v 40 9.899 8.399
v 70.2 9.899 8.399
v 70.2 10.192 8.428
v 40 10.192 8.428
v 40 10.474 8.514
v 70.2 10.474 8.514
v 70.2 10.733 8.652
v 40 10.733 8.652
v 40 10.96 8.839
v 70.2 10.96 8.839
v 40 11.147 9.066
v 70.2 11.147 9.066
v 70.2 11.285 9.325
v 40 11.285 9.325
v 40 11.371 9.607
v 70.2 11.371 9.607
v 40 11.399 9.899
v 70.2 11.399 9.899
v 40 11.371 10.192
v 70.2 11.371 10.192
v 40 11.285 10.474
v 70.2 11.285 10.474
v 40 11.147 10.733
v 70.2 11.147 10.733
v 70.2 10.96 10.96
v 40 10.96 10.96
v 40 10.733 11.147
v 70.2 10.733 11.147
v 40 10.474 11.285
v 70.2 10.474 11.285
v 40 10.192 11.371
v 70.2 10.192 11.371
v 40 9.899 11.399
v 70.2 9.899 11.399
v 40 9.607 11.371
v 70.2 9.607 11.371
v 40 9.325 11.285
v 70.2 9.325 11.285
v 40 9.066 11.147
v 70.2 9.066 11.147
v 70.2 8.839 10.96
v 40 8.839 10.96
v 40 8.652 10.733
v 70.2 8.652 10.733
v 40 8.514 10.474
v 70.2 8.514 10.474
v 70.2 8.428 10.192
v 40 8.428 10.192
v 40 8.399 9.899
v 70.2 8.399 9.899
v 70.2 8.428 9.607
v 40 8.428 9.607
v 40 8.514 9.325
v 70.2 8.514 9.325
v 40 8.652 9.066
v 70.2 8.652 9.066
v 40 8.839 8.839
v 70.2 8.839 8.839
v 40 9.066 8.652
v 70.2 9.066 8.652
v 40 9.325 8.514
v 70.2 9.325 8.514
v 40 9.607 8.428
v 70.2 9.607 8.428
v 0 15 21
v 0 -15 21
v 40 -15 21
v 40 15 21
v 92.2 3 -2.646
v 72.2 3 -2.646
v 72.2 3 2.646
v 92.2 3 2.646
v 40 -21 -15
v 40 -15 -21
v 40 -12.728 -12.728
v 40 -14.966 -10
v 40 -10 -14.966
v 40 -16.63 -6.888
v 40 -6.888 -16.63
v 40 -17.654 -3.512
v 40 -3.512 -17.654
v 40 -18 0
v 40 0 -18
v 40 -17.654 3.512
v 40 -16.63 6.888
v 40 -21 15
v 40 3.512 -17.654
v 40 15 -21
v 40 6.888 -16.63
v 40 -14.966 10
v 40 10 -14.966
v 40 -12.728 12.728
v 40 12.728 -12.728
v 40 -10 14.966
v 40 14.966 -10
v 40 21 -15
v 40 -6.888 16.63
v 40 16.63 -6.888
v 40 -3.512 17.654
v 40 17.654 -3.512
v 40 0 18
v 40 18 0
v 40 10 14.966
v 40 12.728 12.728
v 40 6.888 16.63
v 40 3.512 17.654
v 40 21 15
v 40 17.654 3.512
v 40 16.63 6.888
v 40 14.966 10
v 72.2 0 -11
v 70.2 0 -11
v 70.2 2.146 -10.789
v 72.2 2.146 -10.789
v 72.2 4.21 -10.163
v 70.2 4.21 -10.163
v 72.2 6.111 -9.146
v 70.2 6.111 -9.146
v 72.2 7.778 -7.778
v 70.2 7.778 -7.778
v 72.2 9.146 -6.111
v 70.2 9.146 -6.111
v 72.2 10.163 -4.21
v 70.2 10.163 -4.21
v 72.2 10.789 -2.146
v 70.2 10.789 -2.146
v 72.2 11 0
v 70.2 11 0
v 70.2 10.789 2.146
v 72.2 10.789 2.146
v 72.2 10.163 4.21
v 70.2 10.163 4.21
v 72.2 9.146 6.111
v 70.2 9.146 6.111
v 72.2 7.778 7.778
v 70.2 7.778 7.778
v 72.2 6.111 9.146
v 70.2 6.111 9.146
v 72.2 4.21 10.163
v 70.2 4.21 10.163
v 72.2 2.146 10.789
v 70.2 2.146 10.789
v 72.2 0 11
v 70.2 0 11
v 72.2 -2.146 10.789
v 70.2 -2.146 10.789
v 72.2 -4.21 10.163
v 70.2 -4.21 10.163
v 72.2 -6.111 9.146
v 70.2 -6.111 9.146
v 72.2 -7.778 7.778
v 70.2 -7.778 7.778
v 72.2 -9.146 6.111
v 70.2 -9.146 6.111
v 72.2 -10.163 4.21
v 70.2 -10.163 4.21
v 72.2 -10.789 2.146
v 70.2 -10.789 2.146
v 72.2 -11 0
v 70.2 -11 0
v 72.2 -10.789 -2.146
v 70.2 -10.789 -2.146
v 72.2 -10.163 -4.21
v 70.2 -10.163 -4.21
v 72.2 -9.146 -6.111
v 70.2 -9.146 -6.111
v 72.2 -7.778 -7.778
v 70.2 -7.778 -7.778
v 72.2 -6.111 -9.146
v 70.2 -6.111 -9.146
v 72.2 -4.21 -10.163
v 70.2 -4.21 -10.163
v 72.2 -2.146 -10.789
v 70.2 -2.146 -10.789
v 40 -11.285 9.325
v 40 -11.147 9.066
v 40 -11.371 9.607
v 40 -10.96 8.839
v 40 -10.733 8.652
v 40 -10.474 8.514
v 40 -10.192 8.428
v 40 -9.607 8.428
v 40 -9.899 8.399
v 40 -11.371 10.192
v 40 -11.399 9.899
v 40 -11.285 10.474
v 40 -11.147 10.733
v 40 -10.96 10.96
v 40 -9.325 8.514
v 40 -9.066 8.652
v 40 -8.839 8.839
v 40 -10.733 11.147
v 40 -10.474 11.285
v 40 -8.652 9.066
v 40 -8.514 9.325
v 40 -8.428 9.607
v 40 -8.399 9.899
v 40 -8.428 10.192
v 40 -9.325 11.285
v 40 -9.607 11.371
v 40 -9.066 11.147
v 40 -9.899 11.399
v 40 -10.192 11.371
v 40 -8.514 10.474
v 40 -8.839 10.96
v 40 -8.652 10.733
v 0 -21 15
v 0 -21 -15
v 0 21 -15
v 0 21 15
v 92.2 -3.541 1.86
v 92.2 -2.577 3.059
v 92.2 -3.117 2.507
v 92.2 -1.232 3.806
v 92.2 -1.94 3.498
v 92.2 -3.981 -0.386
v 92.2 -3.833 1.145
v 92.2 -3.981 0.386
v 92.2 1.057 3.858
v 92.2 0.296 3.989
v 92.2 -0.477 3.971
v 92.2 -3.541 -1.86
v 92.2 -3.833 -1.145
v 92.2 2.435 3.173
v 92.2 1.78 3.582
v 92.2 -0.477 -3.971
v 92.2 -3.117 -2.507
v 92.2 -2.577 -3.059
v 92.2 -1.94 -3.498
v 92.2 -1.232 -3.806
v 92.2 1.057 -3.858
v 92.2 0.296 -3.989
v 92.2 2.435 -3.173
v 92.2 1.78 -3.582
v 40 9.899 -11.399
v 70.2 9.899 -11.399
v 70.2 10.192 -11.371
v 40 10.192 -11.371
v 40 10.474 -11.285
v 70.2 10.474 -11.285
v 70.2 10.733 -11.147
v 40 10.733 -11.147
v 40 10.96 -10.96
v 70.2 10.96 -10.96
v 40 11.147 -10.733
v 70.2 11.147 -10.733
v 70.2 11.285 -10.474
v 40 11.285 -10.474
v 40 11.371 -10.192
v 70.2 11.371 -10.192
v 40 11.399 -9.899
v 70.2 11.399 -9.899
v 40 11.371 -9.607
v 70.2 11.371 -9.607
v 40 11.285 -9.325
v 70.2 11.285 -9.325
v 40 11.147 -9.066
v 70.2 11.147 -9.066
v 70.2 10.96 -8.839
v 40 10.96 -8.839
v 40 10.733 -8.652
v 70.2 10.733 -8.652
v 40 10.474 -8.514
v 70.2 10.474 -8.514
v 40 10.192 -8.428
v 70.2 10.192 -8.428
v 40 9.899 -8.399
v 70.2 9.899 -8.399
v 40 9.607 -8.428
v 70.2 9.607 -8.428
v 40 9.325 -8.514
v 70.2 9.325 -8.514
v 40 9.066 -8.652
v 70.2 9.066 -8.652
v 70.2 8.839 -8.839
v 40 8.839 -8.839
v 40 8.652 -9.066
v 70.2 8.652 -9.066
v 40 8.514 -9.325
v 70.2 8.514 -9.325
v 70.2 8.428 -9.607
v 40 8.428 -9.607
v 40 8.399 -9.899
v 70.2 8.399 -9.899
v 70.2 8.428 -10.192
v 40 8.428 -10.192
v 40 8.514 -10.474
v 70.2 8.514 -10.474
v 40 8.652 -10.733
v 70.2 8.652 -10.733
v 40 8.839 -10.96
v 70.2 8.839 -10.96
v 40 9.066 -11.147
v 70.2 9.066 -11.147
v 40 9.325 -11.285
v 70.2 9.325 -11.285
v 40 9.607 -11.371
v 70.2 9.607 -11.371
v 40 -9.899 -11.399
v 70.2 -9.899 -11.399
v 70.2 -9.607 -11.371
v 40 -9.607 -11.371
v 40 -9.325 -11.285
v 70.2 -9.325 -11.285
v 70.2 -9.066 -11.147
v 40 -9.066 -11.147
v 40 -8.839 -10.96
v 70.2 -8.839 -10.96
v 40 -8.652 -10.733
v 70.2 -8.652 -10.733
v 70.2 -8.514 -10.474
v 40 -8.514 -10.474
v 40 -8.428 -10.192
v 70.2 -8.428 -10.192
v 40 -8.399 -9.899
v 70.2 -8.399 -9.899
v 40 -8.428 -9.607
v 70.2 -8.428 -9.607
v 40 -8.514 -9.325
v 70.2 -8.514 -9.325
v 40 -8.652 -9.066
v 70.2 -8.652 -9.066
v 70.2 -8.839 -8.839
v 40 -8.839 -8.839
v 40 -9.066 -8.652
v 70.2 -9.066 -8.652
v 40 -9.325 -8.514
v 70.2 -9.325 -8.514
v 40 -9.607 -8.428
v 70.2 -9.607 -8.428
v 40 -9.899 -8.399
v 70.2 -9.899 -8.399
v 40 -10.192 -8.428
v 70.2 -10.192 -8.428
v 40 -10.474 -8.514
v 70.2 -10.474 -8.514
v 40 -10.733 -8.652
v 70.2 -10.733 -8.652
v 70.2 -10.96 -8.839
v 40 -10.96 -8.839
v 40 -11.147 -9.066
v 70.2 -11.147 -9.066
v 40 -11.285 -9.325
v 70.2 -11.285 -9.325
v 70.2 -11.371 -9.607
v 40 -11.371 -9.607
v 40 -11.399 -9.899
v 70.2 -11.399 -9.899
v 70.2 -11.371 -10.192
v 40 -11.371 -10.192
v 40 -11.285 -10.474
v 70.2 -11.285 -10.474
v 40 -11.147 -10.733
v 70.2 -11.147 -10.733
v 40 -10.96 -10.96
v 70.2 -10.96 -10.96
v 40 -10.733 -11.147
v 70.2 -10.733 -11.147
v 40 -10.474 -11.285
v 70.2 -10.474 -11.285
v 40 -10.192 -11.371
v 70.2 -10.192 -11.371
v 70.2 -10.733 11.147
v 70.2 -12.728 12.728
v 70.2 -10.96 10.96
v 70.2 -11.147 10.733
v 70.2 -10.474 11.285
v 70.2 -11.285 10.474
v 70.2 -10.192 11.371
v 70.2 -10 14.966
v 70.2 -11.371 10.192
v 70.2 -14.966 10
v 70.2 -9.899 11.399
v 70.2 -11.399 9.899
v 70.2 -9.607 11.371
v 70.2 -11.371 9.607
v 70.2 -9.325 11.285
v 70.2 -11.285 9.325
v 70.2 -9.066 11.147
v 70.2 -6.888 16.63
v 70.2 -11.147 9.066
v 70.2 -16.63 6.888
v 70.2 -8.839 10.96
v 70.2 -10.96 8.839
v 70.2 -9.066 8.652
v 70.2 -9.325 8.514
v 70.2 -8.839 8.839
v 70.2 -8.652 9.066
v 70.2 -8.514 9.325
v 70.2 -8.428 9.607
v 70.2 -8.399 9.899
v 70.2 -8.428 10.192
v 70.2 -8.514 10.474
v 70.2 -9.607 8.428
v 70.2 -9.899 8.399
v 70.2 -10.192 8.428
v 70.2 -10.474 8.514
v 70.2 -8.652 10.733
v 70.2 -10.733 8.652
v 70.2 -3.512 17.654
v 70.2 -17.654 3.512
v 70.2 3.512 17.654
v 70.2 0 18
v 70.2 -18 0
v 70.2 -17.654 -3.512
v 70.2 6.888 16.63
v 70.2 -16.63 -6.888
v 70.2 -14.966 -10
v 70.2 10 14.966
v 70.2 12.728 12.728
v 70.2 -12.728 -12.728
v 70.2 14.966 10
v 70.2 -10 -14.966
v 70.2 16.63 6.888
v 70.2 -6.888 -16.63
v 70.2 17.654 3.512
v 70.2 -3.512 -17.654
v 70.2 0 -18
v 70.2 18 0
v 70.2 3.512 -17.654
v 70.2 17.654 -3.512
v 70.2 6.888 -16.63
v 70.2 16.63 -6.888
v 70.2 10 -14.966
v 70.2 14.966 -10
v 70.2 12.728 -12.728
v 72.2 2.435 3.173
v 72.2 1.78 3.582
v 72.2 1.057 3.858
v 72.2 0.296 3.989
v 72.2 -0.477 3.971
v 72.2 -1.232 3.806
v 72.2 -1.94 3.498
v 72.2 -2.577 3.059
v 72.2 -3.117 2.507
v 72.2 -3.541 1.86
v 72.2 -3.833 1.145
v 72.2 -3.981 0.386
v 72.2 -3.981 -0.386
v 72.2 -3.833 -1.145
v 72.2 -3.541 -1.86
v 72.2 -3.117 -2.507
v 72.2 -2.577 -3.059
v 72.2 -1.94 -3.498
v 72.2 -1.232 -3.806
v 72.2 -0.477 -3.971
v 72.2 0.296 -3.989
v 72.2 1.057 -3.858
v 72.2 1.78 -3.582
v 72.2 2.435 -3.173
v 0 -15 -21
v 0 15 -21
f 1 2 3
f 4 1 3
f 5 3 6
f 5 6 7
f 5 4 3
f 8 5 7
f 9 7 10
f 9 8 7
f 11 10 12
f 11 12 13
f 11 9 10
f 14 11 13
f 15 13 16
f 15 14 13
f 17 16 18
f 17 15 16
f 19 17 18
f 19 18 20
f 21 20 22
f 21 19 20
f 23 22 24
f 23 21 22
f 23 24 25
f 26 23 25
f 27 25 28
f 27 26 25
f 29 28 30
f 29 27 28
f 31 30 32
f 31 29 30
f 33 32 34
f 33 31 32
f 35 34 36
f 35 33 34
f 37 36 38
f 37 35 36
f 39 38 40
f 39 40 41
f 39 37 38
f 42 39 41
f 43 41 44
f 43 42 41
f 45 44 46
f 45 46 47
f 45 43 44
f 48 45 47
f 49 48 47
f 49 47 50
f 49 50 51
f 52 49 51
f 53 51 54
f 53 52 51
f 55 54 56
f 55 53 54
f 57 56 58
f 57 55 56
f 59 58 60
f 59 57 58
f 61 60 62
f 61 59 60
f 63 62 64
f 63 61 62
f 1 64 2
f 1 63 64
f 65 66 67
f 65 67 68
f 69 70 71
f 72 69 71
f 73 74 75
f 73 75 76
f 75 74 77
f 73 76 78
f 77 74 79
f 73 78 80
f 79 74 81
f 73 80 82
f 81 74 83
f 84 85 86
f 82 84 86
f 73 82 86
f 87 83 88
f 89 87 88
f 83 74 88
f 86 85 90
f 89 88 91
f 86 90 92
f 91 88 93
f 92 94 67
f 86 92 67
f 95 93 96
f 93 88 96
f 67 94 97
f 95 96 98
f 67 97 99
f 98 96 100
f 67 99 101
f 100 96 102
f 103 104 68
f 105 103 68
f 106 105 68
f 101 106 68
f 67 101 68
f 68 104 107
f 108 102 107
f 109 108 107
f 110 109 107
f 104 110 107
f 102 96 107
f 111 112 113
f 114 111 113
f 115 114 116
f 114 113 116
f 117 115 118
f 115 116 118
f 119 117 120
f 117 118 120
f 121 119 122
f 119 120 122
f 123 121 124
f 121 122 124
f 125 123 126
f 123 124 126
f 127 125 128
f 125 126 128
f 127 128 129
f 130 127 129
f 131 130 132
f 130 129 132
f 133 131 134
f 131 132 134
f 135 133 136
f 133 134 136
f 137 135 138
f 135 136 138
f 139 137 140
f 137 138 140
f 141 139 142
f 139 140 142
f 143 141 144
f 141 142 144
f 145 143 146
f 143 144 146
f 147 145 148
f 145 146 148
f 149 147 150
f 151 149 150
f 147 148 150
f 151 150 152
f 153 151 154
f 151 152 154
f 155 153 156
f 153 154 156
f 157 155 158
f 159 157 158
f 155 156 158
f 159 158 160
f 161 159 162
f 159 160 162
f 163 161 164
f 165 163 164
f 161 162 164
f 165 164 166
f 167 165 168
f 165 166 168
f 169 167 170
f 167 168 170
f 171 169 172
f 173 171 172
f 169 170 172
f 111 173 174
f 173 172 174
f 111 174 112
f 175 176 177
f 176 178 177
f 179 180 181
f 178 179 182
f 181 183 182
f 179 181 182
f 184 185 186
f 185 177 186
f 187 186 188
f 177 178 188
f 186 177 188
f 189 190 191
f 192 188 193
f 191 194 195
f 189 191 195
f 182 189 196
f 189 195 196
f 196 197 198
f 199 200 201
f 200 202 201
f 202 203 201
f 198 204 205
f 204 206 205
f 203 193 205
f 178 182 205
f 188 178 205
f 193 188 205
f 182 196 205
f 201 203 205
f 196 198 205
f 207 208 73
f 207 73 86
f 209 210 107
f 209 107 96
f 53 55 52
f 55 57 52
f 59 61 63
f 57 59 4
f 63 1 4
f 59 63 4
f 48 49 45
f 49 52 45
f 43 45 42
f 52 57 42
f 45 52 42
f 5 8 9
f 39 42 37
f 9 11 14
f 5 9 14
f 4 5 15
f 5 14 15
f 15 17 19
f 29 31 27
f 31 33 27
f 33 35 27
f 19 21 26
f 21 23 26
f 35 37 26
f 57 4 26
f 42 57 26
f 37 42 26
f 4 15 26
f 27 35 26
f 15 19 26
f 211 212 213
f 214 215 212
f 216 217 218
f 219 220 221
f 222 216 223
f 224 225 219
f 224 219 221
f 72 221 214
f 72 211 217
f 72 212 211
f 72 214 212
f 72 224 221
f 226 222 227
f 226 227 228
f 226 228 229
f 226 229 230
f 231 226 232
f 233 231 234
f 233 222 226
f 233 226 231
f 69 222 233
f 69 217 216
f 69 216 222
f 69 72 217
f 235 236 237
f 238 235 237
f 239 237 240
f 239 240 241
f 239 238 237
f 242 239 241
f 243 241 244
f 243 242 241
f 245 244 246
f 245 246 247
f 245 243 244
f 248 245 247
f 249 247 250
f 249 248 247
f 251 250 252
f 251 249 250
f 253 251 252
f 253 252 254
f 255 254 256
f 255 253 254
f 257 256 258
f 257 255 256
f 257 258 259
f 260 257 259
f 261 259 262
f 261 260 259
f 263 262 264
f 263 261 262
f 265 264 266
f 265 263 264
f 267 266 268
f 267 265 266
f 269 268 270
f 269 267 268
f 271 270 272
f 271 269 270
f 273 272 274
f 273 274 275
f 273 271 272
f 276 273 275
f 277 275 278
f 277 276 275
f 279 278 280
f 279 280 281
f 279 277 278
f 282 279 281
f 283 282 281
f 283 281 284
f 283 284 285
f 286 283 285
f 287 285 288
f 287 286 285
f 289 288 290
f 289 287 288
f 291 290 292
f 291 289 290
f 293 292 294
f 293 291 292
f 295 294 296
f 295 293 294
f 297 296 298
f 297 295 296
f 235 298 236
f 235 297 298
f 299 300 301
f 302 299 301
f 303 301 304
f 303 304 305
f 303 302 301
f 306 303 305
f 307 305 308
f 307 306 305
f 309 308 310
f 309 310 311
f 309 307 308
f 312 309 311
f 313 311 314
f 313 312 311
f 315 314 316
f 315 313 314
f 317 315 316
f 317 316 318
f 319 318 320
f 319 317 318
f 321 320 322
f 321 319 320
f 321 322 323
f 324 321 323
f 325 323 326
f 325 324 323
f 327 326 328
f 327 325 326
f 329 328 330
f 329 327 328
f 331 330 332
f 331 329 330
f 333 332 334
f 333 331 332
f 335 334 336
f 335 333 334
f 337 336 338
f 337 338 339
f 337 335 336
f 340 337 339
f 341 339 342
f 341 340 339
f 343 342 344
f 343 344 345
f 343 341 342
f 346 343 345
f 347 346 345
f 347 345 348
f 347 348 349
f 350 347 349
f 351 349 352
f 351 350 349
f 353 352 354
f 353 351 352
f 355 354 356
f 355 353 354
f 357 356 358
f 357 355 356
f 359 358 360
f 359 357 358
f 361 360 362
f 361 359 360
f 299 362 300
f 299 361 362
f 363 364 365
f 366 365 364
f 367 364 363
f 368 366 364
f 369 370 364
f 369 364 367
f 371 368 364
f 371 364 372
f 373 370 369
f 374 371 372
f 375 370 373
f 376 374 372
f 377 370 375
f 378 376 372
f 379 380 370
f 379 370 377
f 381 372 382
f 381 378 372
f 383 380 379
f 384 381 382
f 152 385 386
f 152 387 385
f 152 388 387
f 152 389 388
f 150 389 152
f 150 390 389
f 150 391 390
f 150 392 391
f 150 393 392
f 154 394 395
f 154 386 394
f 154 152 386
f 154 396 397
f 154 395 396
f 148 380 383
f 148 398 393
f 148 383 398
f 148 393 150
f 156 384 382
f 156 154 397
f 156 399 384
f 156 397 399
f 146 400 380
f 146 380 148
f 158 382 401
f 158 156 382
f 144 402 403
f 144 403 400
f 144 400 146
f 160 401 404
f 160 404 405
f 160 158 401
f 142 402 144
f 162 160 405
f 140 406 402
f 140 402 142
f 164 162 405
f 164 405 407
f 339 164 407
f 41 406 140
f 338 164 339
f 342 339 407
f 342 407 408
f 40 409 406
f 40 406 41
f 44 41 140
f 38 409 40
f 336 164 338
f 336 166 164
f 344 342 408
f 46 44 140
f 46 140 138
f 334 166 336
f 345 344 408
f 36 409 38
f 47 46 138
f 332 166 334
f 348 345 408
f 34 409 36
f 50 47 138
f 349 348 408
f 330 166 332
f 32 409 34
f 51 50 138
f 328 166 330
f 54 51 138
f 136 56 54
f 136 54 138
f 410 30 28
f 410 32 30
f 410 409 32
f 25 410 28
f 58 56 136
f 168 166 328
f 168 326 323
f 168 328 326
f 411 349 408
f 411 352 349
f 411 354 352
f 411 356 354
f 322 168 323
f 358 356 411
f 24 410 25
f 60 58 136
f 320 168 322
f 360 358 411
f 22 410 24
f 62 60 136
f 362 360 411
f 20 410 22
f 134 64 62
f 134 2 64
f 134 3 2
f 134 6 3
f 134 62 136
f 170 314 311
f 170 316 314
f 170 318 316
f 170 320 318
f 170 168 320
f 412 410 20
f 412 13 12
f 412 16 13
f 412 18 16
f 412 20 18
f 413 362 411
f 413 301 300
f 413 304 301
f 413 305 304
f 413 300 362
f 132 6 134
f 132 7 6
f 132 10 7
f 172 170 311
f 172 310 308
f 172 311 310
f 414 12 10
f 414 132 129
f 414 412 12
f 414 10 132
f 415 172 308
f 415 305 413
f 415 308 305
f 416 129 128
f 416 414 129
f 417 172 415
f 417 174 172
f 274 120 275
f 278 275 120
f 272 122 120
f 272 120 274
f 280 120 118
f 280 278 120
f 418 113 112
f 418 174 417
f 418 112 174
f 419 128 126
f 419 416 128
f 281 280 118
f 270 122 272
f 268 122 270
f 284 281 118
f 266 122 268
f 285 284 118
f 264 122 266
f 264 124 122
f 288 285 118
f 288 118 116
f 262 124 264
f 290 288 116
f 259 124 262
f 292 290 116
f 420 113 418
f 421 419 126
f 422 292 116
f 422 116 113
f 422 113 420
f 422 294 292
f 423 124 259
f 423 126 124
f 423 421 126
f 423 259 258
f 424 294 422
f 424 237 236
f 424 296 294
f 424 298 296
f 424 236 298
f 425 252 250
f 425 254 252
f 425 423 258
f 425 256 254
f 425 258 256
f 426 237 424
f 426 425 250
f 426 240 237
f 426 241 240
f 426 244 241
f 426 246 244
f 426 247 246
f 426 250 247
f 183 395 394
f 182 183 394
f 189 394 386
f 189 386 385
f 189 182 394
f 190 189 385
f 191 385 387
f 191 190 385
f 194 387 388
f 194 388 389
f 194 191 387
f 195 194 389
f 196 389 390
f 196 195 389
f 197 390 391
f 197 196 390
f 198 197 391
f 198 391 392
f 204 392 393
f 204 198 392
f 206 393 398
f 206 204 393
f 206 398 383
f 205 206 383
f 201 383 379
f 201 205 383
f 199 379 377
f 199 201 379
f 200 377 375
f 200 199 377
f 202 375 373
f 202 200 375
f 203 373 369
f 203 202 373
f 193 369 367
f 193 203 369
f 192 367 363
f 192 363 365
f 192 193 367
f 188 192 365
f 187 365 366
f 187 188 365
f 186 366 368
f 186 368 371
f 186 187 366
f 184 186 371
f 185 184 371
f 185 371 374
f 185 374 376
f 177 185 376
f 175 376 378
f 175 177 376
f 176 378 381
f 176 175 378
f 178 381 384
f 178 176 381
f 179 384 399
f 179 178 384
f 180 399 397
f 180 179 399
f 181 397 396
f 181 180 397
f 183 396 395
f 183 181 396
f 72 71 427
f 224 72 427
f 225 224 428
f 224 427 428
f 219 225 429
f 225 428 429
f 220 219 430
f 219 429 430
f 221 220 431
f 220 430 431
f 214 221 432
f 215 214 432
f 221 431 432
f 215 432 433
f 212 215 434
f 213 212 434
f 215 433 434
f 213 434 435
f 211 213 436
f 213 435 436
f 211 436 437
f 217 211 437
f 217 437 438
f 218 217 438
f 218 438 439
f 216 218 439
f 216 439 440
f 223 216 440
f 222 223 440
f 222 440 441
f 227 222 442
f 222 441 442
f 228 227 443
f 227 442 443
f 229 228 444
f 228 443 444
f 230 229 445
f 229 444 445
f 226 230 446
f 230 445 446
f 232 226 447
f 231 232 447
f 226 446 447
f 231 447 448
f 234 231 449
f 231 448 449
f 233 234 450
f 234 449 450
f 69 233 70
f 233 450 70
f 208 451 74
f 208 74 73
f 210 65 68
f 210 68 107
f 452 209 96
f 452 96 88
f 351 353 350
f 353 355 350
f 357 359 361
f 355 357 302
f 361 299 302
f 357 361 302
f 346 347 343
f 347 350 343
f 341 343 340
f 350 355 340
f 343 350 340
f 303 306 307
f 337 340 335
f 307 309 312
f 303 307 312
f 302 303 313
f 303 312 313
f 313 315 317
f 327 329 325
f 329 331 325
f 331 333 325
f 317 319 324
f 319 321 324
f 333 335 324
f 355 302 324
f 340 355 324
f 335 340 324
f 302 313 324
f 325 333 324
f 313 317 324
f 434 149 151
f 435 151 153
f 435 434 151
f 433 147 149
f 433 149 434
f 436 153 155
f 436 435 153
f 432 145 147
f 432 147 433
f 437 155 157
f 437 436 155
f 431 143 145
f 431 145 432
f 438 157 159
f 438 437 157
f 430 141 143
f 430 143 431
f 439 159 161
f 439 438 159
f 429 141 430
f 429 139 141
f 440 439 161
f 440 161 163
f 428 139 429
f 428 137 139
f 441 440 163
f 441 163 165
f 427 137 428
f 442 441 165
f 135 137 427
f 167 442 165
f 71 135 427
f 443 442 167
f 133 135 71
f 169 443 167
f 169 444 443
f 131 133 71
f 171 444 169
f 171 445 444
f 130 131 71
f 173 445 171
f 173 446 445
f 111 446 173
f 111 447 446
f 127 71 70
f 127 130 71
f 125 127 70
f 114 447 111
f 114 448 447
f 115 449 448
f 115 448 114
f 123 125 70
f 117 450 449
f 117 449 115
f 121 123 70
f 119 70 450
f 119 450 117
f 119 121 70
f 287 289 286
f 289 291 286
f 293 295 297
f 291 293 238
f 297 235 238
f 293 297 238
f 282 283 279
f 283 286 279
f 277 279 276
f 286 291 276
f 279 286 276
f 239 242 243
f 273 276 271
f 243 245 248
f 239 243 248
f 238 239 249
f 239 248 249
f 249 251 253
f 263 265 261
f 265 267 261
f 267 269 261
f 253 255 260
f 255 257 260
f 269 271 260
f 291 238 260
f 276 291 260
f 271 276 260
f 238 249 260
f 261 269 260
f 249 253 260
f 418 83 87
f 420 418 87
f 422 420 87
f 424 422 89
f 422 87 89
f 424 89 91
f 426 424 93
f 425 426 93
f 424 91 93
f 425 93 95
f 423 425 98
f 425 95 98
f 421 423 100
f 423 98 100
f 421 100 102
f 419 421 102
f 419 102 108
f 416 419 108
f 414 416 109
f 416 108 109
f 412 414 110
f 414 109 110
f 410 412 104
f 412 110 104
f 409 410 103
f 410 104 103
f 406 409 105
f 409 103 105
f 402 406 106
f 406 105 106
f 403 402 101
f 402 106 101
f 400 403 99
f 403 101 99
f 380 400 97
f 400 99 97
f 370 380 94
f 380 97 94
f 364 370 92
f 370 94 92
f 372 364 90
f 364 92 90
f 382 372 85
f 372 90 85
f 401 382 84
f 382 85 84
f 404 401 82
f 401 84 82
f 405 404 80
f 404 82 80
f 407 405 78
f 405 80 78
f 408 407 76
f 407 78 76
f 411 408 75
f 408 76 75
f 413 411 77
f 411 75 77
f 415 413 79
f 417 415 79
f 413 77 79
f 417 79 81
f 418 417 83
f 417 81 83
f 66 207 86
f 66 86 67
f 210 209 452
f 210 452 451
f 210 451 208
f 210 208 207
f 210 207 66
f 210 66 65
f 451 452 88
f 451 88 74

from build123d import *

# Parameters (mm, degrees)
BOSS_EXTRUDE1_DEPTH = 40
SKETCH2_R           = 18
SKETCH2_R_2         = 1.5
BOSS_EXTRUDE2_DEPTH = 30.2
SKETCH3_R           = 11
BOSS_EXTRUDE3_DEPTH = 2
BOSS_EXTRUDE4_DEPTH = 20


with BuildPart() as part:
    # Sketch1 → Boss-Extrude1 (new body)
    with BuildSketch(Plane(origin=(0, 0, 0), x_dir=(0, 0, -1), z_dir=(1, 0, 0))):
        Polygon((-21, 15), (-15, 21), (15, 21), (21, 15), (21, -15), (15, -21), (-15, -21), (-21, -15), align=None)
    extrude(amount=BOSS_EXTRUDE1_DEPTH)

    # Sketch2 → Boss-Extrude2 (add)
    with BuildSketch(Plane(origin=(40, 0, 0), x_dir=(0, 0, -1), z_dir=(1, 0, 0))):
        Circle(SKETCH2_R)
        with Locations((-9.899494937, 9.899494937)):
            Circle(SKETCH2_R_2, mode=Mode.SUBTRACT)
        with Locations((9.899494937, 9.899494937)):
            Circle(SKETCH2_R_2, mode=Mode.SUBTRACT)
        with Locations((9.899494937, -9.899494937)):
            Circle(SKETCH2_R_2, mode=Mode.SUBTRACT)
        with Locations((-9.899494937, -9.899494937)):
            Circle(SKETCH2_R_2, mode=Mode.SUBTRACT)
    extrude(amount=BOSS_EXTRUDE2_DEPTH)

    # Sketch3 → Boss-Extrude3 (add)
    with BuildSketch(Plane(origin=(70.2, 0, 0), x_dir=(0, 0, -1), z_dir=(1, 0, 0))):
        Circle(SKETCH3_R)
    extrude(amount=BOSS_EXTRUDE3_DEPTH)

    # Sketch4 → Boss-Extrude4 (add)
    with BuildSketch(Plane(origin=(72.2, 0, 0), x_dir=(0, 0, -1), z_dir=(1, 0, 0))):
        with BuildLine():
            Line((2.645751311, 3), (-2.645751311, 3))
            ThreePointArc((-2.645751311, 3), (0, -4), (2.645751311, 3))
        make_face()
    extrude(amount=BOSS_EXTRUDE4_DEPTH)


solid = part.part
